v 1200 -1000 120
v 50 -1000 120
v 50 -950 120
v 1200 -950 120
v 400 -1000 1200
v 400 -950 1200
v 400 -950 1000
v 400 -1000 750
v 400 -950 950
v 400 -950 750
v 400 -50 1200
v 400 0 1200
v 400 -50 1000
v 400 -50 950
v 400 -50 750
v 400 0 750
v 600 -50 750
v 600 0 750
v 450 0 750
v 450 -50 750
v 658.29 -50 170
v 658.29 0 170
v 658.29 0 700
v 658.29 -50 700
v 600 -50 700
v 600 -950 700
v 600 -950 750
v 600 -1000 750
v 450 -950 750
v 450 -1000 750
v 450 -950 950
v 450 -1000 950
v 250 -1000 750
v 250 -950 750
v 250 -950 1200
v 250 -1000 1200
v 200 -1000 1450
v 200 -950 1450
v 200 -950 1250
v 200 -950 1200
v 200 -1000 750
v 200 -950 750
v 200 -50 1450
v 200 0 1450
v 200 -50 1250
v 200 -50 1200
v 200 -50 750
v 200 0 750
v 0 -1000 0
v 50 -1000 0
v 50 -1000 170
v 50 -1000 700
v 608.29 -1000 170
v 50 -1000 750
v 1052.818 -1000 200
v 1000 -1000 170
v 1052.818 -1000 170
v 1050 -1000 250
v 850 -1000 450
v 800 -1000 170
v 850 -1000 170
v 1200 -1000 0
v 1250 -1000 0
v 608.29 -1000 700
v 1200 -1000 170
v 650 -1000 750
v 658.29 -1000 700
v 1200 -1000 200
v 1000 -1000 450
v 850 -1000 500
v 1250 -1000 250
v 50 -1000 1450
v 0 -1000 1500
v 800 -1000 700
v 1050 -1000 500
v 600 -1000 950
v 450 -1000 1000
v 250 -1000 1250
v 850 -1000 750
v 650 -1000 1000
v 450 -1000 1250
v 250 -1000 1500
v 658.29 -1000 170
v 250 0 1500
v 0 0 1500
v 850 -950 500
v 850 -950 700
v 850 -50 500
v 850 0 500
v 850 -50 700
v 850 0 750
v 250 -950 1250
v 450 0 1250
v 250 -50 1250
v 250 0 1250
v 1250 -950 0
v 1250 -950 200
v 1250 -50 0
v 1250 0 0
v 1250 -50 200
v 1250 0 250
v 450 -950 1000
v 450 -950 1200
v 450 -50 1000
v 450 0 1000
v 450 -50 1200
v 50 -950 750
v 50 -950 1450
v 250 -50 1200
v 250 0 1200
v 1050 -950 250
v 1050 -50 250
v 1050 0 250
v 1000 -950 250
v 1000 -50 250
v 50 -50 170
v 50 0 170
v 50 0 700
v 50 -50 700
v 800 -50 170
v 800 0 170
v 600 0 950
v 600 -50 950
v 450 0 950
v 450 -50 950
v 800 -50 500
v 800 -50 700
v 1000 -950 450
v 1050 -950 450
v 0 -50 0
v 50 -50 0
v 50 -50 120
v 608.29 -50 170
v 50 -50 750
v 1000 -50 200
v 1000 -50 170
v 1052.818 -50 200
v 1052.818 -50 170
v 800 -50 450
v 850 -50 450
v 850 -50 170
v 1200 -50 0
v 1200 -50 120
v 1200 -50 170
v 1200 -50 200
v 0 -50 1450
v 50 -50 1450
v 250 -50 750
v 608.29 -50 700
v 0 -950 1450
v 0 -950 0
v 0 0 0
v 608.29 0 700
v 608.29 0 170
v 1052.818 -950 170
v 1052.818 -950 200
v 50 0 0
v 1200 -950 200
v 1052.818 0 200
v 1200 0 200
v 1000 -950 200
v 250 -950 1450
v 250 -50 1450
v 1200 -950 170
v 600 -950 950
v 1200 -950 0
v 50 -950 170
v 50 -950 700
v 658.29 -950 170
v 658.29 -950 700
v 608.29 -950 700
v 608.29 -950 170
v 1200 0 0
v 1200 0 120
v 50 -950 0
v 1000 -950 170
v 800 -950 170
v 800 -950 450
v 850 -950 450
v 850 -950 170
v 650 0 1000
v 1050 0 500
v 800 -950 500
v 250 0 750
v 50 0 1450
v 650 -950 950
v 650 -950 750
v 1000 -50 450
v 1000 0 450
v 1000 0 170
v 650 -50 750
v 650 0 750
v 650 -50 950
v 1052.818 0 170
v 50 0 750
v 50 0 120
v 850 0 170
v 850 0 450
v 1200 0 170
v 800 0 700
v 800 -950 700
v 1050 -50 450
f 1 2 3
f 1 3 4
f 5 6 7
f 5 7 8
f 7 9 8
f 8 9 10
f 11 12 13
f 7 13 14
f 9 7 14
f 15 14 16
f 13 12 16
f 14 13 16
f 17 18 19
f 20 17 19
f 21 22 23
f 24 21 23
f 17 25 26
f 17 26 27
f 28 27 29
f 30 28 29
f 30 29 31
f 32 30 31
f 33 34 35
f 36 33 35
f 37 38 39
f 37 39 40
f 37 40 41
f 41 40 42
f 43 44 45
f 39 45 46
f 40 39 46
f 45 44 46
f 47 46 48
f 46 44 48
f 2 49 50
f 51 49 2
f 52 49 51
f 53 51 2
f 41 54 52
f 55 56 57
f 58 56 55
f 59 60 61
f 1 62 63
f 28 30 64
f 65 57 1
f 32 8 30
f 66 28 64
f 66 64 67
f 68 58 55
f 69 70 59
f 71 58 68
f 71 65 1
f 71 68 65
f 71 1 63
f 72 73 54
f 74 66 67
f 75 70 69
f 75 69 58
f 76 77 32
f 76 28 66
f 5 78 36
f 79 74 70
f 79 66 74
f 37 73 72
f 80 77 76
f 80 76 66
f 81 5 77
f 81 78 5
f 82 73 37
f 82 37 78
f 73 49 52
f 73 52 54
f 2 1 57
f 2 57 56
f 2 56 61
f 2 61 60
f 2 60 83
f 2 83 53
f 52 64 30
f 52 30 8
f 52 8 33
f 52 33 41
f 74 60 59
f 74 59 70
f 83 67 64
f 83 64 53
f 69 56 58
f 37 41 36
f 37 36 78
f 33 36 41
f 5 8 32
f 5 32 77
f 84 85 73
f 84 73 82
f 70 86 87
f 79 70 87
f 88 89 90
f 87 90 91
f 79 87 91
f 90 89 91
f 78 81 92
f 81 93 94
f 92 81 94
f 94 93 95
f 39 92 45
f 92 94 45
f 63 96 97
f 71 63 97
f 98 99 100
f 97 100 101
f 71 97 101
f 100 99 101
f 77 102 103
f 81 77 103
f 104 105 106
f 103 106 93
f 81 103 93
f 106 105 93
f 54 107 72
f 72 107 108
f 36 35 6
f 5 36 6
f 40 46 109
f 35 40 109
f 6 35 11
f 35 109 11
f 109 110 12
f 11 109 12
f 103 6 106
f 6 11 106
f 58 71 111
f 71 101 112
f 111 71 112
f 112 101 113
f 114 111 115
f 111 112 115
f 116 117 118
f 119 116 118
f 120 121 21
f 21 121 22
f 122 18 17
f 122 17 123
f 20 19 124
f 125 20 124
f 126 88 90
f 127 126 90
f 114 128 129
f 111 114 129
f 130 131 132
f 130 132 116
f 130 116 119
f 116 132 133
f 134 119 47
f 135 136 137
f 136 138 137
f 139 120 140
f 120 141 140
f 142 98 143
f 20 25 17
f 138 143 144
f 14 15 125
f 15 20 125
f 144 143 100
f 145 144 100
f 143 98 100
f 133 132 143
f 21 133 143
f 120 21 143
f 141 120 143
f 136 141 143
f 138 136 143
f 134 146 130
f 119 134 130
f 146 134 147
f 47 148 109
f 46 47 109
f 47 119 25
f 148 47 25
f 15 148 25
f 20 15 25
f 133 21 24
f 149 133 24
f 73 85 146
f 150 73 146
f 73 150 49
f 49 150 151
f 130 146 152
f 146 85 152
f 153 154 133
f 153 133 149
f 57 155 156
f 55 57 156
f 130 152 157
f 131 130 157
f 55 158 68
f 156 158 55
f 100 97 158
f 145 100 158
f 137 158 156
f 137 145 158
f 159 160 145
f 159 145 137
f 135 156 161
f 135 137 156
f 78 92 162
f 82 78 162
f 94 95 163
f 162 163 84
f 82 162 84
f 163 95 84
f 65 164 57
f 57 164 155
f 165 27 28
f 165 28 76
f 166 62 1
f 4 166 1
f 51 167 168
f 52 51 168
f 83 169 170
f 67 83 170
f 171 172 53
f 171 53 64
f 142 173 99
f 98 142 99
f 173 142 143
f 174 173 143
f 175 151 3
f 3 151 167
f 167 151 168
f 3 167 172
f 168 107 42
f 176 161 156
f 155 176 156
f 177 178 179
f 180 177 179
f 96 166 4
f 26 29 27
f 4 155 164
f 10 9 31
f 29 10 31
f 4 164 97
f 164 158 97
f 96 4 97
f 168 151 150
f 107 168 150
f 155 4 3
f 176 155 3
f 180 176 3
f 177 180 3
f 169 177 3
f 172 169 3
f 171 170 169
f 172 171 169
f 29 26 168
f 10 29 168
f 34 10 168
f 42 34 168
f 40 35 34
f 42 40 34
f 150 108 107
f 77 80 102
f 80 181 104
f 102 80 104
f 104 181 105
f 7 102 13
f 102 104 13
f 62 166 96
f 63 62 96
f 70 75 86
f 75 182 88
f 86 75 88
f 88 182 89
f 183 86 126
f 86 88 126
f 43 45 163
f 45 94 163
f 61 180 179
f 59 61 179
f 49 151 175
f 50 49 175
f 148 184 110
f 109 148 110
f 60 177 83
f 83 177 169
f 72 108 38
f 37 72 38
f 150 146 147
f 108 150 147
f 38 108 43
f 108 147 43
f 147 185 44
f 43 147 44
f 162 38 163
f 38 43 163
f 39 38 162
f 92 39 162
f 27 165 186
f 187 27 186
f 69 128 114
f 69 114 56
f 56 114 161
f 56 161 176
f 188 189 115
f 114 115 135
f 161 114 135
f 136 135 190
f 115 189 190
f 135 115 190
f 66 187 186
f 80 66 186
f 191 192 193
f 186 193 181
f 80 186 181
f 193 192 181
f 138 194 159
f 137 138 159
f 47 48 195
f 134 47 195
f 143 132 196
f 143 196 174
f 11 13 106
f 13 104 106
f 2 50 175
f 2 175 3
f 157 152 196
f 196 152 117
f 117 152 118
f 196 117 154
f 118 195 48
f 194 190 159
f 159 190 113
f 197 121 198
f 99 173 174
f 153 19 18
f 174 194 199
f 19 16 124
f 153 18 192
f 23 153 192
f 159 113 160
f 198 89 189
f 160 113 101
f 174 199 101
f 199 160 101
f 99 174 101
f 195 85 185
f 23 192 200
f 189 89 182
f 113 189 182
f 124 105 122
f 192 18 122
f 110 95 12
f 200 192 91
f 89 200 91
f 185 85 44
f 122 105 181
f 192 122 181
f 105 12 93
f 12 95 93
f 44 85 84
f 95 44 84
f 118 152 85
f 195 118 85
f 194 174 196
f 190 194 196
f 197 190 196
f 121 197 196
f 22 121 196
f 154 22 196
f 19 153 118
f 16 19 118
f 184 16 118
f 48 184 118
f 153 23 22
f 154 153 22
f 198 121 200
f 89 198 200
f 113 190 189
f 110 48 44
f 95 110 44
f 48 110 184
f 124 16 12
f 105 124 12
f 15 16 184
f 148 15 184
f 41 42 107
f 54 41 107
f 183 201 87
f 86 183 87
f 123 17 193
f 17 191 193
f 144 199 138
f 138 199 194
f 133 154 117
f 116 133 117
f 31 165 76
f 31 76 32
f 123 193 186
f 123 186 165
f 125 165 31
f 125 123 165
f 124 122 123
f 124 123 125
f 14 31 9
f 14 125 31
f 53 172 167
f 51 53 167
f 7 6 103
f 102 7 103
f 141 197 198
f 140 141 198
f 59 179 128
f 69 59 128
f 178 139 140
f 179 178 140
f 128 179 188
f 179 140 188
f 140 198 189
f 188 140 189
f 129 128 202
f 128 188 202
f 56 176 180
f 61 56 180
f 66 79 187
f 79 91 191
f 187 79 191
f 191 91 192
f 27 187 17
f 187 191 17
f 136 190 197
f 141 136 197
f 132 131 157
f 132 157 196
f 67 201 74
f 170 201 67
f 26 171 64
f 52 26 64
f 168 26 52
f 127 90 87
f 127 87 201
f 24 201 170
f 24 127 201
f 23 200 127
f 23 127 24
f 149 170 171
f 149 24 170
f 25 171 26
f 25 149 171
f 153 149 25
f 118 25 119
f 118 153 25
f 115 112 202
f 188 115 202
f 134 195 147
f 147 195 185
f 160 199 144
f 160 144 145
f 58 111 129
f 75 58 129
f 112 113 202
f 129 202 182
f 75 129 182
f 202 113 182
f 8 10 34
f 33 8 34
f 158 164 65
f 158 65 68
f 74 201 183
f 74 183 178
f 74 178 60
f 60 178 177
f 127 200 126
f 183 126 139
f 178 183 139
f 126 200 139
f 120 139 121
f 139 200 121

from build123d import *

# Parameters (mm, degrees)
F0_W      = 250
F0_H      = 250
F1_DEPTH  = 1000
F2_T      = -50
F3_W      = 1150
F3_H      = 120
F4_DEPTH  = 1100
F5_W      = 900
F5_H      = 200
F6_DEPTH  = 5000
F7_W      = 900
F7_H      = 200
F8_DEPTH  = 300
F9_W      = 900
F9_H      = 200
F10_DEPTH = 300
F11_W     = 900
F11_H     = 200
F12_DEPTH = 300
F13_W     = 900
F13_H     = 200
F14_DEPTH = 300
F15_W     = 900
F15_H     = 200
F16_DEPTH = 300
F17_W     = 150
F17_H     = 200
F17_W_2   = 558.2895040512
F17_H_2   = 530
F17_W_3   = 147.1817493439
F17_H_3   = 30
F18_DEPTH = 5000


with BuildPart() as f1:
    # F0 (on Front) → F1 (new body)
    with BuildSketch(Plane.XZ):
        Polygon((0, 250), (0, 0), (1250, 0), (1250, 250), (1050, 250), align=None)
        Polygon((0, 500), (0, 250), (1050, 250), (1050, 500), (850, 500), align=None)
        Polygon((0, 750), (0, 500), (850, 500), (850, 750), (650, 750), align=None)
        Polygon((0, 1000), (0, 750), (650, 750), (650, 1000), (450, 1000), align=None)
        Polygon((0, 1250), (0, 1000), (450, 1000), (450, 1250), (250, 1250), align=None)
        with Locations((125, 1375)):
            Rectangle(F0_W, F0_H)
    extrude(amount=F1_DEPTH)

    # F2
    f2_openings = [f1.faces().sort_by_distance(p)[0] for p in [
        (0, -500, 750),
    ]]
    offset(amount=F2_T, openings=f2_openings, kind=Kind.INTERSECTION)

    # F3 (on face) → F4 (cut)
    with BuildSketch(Plane.XZ.offset(1000)):
        with Locations((625, 60)):
            Rectangle(F3_W, F3_H)
    extrude(amount=-F4_DEPTH, mode=Mode.SUBTRACT)

    # F5 (on face) → F6 (cut)
    with BuildSketch(Plane.YZ.offset(1250)):
        with Locations((-500, 100)):
            Rectangle(F5_W, F5_H)
    extrude(amount=-F6_DEPTH, mode=Mode.SUBTRACT)

    # F7 (on face) → F8 (cut)
    with BuildSketch(Plane.YZ.offset(1050)):
        with Locations((-500, 350)):
            Rectangle(F7_W, F7_H)
    extrude(amount=-F8_DEPTH, mode=Mode.SUBTRACT)

    # F9 (on face) → F10 (cut)
    with BuildSketch(Plane.YZ.offset(850)):
        with Locations((-500, 600)):
            Rectangle(F9_W, F9_H)
    extrude(amount=-F10_DEPTH, mode=Mode.SUBTRACT)

    # F11 (on face) → F12 (cut)
    with BuildSketch(Plane.YZ.offset(650)):
        with Locations((-500, 850)):
            Rectangle(F11_W, F11_H)
    extrude(amount=-F12_DEPTH, mode=Mode.SUBTRACT)

    # F13 (on face) → F14 (cut)
    with BuildSketch(Plane.YZ.offset(450)):
        with Locations((-500, 1100)):
            Rectangle(F13_W, F13_H)
    extrude(amount=-F14_DEPTH, mode=Mode.SUBTRACT)

    # F15 (on face) → F16 (cut)
    with BuildSketch(Plane.YZ.offset(250)):
        with Locations((-500, 1350)):
            Rectangle(F15_W, F15_H)
    extrude(amount=-F16_DEPTH, mode=Mode.SUBTRACT)

    # F17 (on face) → F18 (cut)
    with BuildSketch(Plane(origin=(0, 0, 0), x_dir=(-1, 0, 0), z_dir=(0, 1, 0))):
        with Locations((-525, 850)):
            Rectangle(F17_W, F17_H)
        Polygon((-200, 750), (-50, 750), (-50, 1450), (-200, 1450), (-200, 1200), align=None)
        Polygon((-250, 750), (-250, 1200), (-400, 1200), (-400, 950), (-400, 750), align=None)
        with Locations((-329.1447520256, 435)):
            Rectangle(F17_W_2, F17_H_2)
        Polygon((-658.2895040512, 700), (-800, 700), (-800, 450), (-800, 170), (-658.2895040512, 170), align=None)
        Polygon((-850, 170), (-850, 450), (-1000, 450), (-1000, 200), (-1000, 170), align=None)
        with Locations((-1126.4091253281, 185)):
            Rectangle(F17_W_3, F17_H_3)
    extrude(amount=-F18_DEPTH, mode=Mode.SUBTRACT)


solid = f1.part
